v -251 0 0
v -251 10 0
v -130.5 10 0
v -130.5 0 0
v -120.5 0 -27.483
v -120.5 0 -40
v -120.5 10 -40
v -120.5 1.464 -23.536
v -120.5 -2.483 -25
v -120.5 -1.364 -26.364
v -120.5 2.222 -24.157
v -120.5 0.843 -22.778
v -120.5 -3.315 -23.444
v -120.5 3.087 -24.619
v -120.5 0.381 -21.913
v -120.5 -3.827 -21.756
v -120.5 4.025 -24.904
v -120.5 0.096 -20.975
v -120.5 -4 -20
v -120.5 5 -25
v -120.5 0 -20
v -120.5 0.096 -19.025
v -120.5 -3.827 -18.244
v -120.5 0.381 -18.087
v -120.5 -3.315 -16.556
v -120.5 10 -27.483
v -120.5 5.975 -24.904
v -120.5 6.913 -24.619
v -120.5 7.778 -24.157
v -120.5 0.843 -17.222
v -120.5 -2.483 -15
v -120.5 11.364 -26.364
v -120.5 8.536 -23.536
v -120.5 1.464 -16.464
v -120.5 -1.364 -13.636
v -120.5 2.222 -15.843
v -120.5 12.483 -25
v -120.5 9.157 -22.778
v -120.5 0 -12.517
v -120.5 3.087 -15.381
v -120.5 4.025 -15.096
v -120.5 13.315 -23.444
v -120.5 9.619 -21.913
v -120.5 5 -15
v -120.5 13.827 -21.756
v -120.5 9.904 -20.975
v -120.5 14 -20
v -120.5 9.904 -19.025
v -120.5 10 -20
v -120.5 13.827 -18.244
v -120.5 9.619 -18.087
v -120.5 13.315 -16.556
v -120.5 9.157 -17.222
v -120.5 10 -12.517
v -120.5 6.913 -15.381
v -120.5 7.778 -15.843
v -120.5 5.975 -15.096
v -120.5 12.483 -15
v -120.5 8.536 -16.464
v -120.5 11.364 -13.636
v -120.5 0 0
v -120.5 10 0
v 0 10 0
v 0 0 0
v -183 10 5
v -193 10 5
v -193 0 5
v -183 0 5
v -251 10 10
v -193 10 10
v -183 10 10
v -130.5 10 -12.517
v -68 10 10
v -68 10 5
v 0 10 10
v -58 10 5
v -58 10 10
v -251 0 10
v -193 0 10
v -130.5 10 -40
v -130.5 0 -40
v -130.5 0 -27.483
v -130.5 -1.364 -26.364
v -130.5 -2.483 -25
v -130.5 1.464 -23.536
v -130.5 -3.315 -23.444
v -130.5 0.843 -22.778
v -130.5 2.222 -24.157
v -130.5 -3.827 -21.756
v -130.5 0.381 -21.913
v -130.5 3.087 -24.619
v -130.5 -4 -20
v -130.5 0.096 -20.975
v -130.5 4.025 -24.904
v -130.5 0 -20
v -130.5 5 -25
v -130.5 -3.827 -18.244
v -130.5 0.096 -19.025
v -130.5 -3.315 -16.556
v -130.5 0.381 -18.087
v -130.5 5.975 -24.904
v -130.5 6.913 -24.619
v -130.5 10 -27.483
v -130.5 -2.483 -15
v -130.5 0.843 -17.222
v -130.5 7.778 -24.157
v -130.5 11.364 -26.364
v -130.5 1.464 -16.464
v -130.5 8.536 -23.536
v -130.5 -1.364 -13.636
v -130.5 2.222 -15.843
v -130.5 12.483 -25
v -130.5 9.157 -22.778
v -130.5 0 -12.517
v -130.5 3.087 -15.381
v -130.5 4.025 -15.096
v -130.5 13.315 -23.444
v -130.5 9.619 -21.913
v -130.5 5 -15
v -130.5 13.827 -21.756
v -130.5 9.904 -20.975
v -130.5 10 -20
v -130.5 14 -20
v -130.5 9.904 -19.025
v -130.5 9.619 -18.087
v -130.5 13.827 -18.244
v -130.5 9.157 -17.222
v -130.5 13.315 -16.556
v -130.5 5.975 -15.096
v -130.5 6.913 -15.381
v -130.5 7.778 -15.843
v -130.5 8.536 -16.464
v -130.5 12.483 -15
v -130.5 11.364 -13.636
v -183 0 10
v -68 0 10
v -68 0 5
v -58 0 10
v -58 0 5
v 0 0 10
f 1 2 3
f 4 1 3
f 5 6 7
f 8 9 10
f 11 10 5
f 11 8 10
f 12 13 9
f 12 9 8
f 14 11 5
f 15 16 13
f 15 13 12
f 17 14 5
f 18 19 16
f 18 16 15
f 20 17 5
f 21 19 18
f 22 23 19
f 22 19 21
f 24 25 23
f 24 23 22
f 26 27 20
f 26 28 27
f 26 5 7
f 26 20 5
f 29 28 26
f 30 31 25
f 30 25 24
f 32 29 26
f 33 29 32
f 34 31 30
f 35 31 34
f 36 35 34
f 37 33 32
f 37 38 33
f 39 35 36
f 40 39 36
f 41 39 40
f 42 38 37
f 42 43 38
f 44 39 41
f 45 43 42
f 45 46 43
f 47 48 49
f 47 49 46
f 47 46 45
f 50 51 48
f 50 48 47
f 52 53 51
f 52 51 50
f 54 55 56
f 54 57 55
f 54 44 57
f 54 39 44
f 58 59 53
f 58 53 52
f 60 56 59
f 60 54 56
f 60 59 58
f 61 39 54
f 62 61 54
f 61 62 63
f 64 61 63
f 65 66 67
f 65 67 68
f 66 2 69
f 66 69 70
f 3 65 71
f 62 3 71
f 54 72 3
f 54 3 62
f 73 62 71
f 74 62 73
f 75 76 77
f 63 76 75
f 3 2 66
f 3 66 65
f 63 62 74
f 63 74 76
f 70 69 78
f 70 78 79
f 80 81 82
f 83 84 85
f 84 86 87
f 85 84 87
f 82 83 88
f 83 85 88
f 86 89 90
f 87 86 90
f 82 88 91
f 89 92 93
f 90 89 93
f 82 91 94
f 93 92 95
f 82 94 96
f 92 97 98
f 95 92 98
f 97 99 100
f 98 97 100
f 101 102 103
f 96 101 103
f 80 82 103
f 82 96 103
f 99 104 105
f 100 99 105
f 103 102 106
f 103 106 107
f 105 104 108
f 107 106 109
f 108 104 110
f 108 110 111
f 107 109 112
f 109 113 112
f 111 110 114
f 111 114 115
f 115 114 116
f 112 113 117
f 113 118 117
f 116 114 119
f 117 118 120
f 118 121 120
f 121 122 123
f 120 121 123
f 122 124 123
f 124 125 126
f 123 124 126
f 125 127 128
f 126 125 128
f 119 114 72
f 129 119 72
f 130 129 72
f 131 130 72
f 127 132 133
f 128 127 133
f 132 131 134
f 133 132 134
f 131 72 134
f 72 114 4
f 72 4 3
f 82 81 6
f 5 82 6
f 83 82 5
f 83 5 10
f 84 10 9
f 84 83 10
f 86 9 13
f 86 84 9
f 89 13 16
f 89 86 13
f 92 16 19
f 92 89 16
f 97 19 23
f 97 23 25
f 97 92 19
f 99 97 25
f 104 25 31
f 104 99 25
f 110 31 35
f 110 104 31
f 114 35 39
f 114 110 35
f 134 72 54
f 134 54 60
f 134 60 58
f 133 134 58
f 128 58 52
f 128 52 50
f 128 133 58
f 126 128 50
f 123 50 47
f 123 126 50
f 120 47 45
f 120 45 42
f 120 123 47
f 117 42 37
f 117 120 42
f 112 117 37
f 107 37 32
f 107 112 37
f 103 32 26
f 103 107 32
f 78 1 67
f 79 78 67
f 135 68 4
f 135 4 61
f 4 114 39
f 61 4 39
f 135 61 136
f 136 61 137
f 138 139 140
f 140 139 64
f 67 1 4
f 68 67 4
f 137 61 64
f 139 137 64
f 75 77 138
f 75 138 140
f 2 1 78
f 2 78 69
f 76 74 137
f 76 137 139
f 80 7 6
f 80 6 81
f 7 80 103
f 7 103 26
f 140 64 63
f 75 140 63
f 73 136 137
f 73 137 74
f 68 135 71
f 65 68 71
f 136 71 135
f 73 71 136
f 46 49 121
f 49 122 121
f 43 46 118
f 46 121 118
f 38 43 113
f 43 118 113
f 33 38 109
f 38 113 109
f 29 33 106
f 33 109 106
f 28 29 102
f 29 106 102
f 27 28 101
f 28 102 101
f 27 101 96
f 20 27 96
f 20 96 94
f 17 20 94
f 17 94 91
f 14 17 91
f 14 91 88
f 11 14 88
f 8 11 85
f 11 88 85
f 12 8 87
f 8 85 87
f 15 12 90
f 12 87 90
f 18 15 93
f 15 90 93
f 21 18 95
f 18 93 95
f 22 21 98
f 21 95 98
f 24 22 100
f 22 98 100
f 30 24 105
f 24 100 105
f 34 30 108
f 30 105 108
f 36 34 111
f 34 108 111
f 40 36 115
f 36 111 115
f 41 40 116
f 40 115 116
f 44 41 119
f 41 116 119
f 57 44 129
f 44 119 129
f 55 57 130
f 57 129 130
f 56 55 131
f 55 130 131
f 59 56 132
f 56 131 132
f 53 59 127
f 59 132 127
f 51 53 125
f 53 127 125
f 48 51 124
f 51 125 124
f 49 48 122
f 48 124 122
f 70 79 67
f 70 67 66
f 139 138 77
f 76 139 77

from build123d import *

# Parameters (mm, degrees)
SKETCH1_W           = 251
SKETCH1_H           = 10
BOSS_EXTRUDE1_DEPTH = 10
SKETCH2_W           = 10
SKETCH2_H           = 10
CUT_EXTRUDE1_DEPTH  = 5
SKETCH4_W           = 10
SKETCH4_H           = 10
BOSS_EXTRUDE2_DEPTH = 40
CUT_EXTRUDE2_REACH  = 138.859
SKETCH5_R           = 5
SKETCH7_R           = 9
SKETCH7_R_2         = 5
BOSS_EXTRUDE3_DEPTH = 10


with BuildPart() as part:
    # Sketch1 → Boss-Extrude1 (new body)
    with BuildSketch(Plane.XY):
        with Locations((-125.5, 5)):
            Rectangle(SKETCH1_W, SKETCH1_H)
    extrude(amount=BOSS_EXTRUDE1_DEPTH)

    # Sketch2 → Cut-Extrude1 (cut)
    with BuildSketch(Plane.XY.offset(10)):
        with Locations((-188, 5)):
            Rectangle(SKETCH2_W, SKETCH2_H)
        with Locations((-63, 5)):
            Rectangle(SKETCH2_W, SKETCH2_H)
    extrude(amount=-CUT_EXTRUDE1_DEPTH, mode=Mode.SUBTRACT)

    # Sketch4 → Boss-Extrude2 (add)
    with BuildSketch(Plane(origin=(0, 0, 0), x_dir=(-1, 0, 0), z_dir=(0, 0, -1))):
        with Locations((125.5, 5)):
            Rectangle(SKETCH4_W, SKETCH4_H)
    extrude(amount=BOSS_EXTRUDE2_DEPTH)

    # Sketch5 → Cut-Extrude2 (cut, up to next)
    with BuildSketch(Plane.ZY.offset(130.5), mode=Mode.PRIVATE) as cut_extrude2_sk1:
        with Locations((-20, 5)):
            Circle(SKETCH5_R)
    cut_extrude2_tool1 = extrude(cut_extrude2_sk1.sketch, amount=-CUT_EXTRUDE2_REACH, mode=Mode.PRIVATE) & part.part
    add(cut_extrude2_tool1.solids().sort_by_distance((-130.5, 5, -20))[0], mode=Mode.SUBTRACT)


with BuildPart() as cut_extrude2_piece_1:
    # of the separate pieces the step leaves, piece 1, a body of its own (cut_extrude2_pieces)
    add(part.part.solids().sort_by_distance((0, 0, 0))[0])



with BuildPart() as cut_extrude2_piece_2:
    # of the separate pieces the step leaves, piece 2, a body of its own (cut_extrude2_pieces)
    add(part.part.solids().sort_by_distance((-120.5, 0, -40))[0])


with BuildPart() as cut_extrude2_piece_1_1:
    add(cut_extrude2_piece_1.part)

    add(cut_extrude2_piece_2.part)  # Boss-Extrude3 merges Cut-Extrude2 piece 2
    # Sketch7 → Boss-Extrude3 (add)
    with BuildSketch(Plane.ZY.offset(130.5)):
        with Locations((-20, 5)):
            Circle(SKETCH7_R)
        with Locations((-20, 5)):
            Circle(SKETCH7_R_2, mode=Mode.SUBTRACT)
    extrude(amount=-BOSS_EXTRUDE3_DEPTH)


solid = cut_extrude2_piece_1_1.part
